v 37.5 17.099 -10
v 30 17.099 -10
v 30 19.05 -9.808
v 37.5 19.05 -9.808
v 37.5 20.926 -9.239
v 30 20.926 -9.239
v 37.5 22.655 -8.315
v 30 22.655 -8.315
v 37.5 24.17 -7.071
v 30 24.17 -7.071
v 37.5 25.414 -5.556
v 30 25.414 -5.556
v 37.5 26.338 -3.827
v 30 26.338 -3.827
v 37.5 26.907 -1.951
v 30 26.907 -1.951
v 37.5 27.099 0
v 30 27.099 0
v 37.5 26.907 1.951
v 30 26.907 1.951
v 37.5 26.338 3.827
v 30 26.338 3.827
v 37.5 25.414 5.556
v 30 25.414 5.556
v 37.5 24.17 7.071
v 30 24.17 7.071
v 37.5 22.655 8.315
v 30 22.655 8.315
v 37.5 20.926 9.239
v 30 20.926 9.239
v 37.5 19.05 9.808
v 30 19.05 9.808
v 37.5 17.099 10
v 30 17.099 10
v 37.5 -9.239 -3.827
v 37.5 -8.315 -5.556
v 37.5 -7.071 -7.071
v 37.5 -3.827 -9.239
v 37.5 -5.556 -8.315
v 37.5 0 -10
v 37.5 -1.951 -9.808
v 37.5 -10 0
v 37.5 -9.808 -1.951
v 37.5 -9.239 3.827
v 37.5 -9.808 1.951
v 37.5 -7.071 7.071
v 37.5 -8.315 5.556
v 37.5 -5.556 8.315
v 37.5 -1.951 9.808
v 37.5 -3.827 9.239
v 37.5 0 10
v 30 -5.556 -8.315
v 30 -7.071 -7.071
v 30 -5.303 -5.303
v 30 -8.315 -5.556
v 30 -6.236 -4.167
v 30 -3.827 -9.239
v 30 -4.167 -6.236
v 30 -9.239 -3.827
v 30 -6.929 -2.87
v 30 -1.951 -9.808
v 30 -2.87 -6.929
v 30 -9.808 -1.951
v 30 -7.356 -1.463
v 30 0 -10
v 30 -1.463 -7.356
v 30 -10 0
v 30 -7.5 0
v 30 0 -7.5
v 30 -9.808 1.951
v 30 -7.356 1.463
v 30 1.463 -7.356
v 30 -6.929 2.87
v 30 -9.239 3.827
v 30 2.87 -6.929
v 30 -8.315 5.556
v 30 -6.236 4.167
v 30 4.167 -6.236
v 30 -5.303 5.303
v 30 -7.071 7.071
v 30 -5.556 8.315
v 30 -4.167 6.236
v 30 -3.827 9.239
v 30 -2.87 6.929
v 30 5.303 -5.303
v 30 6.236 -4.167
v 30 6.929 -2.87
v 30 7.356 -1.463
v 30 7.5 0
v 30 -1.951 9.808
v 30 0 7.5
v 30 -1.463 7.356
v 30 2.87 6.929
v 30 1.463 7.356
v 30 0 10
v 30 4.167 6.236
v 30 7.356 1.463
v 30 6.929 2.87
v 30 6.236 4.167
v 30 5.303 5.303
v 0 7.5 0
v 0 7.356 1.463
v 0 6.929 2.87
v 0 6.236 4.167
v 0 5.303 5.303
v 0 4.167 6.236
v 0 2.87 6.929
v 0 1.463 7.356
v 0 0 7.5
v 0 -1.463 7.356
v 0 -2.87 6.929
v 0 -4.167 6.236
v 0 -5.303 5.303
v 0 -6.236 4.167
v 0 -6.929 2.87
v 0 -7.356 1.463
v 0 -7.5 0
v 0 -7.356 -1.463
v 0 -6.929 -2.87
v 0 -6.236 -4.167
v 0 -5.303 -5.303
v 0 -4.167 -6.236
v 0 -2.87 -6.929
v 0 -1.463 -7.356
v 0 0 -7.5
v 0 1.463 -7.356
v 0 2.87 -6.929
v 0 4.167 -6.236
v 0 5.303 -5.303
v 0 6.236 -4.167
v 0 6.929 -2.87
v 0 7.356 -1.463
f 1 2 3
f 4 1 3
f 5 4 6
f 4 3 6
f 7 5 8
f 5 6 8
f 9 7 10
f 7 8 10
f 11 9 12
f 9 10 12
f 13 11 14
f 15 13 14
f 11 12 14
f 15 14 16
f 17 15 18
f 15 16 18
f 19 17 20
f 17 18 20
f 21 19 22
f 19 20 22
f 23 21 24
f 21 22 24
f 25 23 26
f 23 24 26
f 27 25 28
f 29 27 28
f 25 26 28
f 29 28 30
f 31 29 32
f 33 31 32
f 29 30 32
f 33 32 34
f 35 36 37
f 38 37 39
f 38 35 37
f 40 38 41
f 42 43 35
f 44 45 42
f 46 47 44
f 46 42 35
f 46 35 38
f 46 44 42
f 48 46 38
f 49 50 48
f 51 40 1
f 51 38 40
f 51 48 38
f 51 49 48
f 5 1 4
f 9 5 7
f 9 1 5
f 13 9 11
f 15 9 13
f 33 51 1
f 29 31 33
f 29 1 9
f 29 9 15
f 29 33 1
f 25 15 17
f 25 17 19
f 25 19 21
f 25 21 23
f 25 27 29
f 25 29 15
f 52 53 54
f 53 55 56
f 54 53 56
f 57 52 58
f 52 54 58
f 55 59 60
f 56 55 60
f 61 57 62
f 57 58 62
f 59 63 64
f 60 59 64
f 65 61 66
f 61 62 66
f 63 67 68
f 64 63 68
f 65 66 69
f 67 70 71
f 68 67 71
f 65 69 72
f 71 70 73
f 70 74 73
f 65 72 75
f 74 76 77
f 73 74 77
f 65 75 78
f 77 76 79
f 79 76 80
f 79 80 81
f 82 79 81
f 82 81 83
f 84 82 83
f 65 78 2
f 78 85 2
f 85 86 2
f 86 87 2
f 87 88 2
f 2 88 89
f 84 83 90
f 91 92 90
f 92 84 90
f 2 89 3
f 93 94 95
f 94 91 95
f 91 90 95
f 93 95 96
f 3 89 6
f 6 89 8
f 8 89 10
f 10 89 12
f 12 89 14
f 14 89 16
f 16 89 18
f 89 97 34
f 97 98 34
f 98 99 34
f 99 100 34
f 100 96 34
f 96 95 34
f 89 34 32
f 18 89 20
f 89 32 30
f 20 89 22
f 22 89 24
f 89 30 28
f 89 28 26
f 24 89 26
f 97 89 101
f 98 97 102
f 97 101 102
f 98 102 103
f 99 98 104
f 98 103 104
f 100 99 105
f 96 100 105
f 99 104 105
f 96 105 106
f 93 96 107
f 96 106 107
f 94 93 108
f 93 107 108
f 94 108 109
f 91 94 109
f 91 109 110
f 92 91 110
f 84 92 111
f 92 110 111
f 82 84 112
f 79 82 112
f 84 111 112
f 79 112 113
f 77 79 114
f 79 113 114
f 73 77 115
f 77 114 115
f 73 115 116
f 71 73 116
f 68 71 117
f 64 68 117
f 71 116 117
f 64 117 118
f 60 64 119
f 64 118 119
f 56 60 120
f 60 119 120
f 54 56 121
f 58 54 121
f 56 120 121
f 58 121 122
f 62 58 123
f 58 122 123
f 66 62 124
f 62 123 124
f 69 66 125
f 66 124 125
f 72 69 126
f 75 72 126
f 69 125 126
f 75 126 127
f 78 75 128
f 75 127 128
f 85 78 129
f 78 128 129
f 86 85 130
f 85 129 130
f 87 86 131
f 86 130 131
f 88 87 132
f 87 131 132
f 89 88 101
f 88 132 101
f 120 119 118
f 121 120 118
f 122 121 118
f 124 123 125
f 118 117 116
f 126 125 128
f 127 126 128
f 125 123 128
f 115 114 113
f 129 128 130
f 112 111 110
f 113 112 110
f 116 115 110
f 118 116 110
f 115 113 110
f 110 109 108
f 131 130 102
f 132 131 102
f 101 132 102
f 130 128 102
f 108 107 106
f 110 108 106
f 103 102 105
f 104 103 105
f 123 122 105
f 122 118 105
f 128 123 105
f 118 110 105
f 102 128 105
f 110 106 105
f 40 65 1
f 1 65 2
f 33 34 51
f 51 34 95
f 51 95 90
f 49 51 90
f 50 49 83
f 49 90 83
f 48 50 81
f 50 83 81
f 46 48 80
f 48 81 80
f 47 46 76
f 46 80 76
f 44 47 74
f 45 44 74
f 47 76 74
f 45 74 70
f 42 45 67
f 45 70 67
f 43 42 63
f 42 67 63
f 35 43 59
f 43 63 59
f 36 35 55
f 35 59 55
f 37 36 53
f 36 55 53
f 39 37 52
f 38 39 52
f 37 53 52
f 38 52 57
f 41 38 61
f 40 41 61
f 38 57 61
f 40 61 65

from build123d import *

# Parameters (mm, degrees)
F0_R     = 7.5
F1_DEPTH = 30
F3_DEPTH = 7.5


with BuildPart() as f1:
    # F0 (on Right) → F1 (new body)
    with BuildSketch(Plane.YZ):
        Circle(F0_R)
    extrude(amount=F1_DEPTH)

    # F2 (on face) → F3 (join)
    with BuildSketch(Plane.YZ.offset(30)):
        with BuildLine():
            Line((17.09929, 10), (0, 10))
            ThreePointArc((0, 10), (-10, 0), (0, -10))
            Line((0, -10), (17.09929, -10))
            ThreePointArc((17.09929, -10), (27.09929, 0), (17.09929, 10))
        make_face()
    extrude(amount=F3_DEPTH)


solid = f1.part
